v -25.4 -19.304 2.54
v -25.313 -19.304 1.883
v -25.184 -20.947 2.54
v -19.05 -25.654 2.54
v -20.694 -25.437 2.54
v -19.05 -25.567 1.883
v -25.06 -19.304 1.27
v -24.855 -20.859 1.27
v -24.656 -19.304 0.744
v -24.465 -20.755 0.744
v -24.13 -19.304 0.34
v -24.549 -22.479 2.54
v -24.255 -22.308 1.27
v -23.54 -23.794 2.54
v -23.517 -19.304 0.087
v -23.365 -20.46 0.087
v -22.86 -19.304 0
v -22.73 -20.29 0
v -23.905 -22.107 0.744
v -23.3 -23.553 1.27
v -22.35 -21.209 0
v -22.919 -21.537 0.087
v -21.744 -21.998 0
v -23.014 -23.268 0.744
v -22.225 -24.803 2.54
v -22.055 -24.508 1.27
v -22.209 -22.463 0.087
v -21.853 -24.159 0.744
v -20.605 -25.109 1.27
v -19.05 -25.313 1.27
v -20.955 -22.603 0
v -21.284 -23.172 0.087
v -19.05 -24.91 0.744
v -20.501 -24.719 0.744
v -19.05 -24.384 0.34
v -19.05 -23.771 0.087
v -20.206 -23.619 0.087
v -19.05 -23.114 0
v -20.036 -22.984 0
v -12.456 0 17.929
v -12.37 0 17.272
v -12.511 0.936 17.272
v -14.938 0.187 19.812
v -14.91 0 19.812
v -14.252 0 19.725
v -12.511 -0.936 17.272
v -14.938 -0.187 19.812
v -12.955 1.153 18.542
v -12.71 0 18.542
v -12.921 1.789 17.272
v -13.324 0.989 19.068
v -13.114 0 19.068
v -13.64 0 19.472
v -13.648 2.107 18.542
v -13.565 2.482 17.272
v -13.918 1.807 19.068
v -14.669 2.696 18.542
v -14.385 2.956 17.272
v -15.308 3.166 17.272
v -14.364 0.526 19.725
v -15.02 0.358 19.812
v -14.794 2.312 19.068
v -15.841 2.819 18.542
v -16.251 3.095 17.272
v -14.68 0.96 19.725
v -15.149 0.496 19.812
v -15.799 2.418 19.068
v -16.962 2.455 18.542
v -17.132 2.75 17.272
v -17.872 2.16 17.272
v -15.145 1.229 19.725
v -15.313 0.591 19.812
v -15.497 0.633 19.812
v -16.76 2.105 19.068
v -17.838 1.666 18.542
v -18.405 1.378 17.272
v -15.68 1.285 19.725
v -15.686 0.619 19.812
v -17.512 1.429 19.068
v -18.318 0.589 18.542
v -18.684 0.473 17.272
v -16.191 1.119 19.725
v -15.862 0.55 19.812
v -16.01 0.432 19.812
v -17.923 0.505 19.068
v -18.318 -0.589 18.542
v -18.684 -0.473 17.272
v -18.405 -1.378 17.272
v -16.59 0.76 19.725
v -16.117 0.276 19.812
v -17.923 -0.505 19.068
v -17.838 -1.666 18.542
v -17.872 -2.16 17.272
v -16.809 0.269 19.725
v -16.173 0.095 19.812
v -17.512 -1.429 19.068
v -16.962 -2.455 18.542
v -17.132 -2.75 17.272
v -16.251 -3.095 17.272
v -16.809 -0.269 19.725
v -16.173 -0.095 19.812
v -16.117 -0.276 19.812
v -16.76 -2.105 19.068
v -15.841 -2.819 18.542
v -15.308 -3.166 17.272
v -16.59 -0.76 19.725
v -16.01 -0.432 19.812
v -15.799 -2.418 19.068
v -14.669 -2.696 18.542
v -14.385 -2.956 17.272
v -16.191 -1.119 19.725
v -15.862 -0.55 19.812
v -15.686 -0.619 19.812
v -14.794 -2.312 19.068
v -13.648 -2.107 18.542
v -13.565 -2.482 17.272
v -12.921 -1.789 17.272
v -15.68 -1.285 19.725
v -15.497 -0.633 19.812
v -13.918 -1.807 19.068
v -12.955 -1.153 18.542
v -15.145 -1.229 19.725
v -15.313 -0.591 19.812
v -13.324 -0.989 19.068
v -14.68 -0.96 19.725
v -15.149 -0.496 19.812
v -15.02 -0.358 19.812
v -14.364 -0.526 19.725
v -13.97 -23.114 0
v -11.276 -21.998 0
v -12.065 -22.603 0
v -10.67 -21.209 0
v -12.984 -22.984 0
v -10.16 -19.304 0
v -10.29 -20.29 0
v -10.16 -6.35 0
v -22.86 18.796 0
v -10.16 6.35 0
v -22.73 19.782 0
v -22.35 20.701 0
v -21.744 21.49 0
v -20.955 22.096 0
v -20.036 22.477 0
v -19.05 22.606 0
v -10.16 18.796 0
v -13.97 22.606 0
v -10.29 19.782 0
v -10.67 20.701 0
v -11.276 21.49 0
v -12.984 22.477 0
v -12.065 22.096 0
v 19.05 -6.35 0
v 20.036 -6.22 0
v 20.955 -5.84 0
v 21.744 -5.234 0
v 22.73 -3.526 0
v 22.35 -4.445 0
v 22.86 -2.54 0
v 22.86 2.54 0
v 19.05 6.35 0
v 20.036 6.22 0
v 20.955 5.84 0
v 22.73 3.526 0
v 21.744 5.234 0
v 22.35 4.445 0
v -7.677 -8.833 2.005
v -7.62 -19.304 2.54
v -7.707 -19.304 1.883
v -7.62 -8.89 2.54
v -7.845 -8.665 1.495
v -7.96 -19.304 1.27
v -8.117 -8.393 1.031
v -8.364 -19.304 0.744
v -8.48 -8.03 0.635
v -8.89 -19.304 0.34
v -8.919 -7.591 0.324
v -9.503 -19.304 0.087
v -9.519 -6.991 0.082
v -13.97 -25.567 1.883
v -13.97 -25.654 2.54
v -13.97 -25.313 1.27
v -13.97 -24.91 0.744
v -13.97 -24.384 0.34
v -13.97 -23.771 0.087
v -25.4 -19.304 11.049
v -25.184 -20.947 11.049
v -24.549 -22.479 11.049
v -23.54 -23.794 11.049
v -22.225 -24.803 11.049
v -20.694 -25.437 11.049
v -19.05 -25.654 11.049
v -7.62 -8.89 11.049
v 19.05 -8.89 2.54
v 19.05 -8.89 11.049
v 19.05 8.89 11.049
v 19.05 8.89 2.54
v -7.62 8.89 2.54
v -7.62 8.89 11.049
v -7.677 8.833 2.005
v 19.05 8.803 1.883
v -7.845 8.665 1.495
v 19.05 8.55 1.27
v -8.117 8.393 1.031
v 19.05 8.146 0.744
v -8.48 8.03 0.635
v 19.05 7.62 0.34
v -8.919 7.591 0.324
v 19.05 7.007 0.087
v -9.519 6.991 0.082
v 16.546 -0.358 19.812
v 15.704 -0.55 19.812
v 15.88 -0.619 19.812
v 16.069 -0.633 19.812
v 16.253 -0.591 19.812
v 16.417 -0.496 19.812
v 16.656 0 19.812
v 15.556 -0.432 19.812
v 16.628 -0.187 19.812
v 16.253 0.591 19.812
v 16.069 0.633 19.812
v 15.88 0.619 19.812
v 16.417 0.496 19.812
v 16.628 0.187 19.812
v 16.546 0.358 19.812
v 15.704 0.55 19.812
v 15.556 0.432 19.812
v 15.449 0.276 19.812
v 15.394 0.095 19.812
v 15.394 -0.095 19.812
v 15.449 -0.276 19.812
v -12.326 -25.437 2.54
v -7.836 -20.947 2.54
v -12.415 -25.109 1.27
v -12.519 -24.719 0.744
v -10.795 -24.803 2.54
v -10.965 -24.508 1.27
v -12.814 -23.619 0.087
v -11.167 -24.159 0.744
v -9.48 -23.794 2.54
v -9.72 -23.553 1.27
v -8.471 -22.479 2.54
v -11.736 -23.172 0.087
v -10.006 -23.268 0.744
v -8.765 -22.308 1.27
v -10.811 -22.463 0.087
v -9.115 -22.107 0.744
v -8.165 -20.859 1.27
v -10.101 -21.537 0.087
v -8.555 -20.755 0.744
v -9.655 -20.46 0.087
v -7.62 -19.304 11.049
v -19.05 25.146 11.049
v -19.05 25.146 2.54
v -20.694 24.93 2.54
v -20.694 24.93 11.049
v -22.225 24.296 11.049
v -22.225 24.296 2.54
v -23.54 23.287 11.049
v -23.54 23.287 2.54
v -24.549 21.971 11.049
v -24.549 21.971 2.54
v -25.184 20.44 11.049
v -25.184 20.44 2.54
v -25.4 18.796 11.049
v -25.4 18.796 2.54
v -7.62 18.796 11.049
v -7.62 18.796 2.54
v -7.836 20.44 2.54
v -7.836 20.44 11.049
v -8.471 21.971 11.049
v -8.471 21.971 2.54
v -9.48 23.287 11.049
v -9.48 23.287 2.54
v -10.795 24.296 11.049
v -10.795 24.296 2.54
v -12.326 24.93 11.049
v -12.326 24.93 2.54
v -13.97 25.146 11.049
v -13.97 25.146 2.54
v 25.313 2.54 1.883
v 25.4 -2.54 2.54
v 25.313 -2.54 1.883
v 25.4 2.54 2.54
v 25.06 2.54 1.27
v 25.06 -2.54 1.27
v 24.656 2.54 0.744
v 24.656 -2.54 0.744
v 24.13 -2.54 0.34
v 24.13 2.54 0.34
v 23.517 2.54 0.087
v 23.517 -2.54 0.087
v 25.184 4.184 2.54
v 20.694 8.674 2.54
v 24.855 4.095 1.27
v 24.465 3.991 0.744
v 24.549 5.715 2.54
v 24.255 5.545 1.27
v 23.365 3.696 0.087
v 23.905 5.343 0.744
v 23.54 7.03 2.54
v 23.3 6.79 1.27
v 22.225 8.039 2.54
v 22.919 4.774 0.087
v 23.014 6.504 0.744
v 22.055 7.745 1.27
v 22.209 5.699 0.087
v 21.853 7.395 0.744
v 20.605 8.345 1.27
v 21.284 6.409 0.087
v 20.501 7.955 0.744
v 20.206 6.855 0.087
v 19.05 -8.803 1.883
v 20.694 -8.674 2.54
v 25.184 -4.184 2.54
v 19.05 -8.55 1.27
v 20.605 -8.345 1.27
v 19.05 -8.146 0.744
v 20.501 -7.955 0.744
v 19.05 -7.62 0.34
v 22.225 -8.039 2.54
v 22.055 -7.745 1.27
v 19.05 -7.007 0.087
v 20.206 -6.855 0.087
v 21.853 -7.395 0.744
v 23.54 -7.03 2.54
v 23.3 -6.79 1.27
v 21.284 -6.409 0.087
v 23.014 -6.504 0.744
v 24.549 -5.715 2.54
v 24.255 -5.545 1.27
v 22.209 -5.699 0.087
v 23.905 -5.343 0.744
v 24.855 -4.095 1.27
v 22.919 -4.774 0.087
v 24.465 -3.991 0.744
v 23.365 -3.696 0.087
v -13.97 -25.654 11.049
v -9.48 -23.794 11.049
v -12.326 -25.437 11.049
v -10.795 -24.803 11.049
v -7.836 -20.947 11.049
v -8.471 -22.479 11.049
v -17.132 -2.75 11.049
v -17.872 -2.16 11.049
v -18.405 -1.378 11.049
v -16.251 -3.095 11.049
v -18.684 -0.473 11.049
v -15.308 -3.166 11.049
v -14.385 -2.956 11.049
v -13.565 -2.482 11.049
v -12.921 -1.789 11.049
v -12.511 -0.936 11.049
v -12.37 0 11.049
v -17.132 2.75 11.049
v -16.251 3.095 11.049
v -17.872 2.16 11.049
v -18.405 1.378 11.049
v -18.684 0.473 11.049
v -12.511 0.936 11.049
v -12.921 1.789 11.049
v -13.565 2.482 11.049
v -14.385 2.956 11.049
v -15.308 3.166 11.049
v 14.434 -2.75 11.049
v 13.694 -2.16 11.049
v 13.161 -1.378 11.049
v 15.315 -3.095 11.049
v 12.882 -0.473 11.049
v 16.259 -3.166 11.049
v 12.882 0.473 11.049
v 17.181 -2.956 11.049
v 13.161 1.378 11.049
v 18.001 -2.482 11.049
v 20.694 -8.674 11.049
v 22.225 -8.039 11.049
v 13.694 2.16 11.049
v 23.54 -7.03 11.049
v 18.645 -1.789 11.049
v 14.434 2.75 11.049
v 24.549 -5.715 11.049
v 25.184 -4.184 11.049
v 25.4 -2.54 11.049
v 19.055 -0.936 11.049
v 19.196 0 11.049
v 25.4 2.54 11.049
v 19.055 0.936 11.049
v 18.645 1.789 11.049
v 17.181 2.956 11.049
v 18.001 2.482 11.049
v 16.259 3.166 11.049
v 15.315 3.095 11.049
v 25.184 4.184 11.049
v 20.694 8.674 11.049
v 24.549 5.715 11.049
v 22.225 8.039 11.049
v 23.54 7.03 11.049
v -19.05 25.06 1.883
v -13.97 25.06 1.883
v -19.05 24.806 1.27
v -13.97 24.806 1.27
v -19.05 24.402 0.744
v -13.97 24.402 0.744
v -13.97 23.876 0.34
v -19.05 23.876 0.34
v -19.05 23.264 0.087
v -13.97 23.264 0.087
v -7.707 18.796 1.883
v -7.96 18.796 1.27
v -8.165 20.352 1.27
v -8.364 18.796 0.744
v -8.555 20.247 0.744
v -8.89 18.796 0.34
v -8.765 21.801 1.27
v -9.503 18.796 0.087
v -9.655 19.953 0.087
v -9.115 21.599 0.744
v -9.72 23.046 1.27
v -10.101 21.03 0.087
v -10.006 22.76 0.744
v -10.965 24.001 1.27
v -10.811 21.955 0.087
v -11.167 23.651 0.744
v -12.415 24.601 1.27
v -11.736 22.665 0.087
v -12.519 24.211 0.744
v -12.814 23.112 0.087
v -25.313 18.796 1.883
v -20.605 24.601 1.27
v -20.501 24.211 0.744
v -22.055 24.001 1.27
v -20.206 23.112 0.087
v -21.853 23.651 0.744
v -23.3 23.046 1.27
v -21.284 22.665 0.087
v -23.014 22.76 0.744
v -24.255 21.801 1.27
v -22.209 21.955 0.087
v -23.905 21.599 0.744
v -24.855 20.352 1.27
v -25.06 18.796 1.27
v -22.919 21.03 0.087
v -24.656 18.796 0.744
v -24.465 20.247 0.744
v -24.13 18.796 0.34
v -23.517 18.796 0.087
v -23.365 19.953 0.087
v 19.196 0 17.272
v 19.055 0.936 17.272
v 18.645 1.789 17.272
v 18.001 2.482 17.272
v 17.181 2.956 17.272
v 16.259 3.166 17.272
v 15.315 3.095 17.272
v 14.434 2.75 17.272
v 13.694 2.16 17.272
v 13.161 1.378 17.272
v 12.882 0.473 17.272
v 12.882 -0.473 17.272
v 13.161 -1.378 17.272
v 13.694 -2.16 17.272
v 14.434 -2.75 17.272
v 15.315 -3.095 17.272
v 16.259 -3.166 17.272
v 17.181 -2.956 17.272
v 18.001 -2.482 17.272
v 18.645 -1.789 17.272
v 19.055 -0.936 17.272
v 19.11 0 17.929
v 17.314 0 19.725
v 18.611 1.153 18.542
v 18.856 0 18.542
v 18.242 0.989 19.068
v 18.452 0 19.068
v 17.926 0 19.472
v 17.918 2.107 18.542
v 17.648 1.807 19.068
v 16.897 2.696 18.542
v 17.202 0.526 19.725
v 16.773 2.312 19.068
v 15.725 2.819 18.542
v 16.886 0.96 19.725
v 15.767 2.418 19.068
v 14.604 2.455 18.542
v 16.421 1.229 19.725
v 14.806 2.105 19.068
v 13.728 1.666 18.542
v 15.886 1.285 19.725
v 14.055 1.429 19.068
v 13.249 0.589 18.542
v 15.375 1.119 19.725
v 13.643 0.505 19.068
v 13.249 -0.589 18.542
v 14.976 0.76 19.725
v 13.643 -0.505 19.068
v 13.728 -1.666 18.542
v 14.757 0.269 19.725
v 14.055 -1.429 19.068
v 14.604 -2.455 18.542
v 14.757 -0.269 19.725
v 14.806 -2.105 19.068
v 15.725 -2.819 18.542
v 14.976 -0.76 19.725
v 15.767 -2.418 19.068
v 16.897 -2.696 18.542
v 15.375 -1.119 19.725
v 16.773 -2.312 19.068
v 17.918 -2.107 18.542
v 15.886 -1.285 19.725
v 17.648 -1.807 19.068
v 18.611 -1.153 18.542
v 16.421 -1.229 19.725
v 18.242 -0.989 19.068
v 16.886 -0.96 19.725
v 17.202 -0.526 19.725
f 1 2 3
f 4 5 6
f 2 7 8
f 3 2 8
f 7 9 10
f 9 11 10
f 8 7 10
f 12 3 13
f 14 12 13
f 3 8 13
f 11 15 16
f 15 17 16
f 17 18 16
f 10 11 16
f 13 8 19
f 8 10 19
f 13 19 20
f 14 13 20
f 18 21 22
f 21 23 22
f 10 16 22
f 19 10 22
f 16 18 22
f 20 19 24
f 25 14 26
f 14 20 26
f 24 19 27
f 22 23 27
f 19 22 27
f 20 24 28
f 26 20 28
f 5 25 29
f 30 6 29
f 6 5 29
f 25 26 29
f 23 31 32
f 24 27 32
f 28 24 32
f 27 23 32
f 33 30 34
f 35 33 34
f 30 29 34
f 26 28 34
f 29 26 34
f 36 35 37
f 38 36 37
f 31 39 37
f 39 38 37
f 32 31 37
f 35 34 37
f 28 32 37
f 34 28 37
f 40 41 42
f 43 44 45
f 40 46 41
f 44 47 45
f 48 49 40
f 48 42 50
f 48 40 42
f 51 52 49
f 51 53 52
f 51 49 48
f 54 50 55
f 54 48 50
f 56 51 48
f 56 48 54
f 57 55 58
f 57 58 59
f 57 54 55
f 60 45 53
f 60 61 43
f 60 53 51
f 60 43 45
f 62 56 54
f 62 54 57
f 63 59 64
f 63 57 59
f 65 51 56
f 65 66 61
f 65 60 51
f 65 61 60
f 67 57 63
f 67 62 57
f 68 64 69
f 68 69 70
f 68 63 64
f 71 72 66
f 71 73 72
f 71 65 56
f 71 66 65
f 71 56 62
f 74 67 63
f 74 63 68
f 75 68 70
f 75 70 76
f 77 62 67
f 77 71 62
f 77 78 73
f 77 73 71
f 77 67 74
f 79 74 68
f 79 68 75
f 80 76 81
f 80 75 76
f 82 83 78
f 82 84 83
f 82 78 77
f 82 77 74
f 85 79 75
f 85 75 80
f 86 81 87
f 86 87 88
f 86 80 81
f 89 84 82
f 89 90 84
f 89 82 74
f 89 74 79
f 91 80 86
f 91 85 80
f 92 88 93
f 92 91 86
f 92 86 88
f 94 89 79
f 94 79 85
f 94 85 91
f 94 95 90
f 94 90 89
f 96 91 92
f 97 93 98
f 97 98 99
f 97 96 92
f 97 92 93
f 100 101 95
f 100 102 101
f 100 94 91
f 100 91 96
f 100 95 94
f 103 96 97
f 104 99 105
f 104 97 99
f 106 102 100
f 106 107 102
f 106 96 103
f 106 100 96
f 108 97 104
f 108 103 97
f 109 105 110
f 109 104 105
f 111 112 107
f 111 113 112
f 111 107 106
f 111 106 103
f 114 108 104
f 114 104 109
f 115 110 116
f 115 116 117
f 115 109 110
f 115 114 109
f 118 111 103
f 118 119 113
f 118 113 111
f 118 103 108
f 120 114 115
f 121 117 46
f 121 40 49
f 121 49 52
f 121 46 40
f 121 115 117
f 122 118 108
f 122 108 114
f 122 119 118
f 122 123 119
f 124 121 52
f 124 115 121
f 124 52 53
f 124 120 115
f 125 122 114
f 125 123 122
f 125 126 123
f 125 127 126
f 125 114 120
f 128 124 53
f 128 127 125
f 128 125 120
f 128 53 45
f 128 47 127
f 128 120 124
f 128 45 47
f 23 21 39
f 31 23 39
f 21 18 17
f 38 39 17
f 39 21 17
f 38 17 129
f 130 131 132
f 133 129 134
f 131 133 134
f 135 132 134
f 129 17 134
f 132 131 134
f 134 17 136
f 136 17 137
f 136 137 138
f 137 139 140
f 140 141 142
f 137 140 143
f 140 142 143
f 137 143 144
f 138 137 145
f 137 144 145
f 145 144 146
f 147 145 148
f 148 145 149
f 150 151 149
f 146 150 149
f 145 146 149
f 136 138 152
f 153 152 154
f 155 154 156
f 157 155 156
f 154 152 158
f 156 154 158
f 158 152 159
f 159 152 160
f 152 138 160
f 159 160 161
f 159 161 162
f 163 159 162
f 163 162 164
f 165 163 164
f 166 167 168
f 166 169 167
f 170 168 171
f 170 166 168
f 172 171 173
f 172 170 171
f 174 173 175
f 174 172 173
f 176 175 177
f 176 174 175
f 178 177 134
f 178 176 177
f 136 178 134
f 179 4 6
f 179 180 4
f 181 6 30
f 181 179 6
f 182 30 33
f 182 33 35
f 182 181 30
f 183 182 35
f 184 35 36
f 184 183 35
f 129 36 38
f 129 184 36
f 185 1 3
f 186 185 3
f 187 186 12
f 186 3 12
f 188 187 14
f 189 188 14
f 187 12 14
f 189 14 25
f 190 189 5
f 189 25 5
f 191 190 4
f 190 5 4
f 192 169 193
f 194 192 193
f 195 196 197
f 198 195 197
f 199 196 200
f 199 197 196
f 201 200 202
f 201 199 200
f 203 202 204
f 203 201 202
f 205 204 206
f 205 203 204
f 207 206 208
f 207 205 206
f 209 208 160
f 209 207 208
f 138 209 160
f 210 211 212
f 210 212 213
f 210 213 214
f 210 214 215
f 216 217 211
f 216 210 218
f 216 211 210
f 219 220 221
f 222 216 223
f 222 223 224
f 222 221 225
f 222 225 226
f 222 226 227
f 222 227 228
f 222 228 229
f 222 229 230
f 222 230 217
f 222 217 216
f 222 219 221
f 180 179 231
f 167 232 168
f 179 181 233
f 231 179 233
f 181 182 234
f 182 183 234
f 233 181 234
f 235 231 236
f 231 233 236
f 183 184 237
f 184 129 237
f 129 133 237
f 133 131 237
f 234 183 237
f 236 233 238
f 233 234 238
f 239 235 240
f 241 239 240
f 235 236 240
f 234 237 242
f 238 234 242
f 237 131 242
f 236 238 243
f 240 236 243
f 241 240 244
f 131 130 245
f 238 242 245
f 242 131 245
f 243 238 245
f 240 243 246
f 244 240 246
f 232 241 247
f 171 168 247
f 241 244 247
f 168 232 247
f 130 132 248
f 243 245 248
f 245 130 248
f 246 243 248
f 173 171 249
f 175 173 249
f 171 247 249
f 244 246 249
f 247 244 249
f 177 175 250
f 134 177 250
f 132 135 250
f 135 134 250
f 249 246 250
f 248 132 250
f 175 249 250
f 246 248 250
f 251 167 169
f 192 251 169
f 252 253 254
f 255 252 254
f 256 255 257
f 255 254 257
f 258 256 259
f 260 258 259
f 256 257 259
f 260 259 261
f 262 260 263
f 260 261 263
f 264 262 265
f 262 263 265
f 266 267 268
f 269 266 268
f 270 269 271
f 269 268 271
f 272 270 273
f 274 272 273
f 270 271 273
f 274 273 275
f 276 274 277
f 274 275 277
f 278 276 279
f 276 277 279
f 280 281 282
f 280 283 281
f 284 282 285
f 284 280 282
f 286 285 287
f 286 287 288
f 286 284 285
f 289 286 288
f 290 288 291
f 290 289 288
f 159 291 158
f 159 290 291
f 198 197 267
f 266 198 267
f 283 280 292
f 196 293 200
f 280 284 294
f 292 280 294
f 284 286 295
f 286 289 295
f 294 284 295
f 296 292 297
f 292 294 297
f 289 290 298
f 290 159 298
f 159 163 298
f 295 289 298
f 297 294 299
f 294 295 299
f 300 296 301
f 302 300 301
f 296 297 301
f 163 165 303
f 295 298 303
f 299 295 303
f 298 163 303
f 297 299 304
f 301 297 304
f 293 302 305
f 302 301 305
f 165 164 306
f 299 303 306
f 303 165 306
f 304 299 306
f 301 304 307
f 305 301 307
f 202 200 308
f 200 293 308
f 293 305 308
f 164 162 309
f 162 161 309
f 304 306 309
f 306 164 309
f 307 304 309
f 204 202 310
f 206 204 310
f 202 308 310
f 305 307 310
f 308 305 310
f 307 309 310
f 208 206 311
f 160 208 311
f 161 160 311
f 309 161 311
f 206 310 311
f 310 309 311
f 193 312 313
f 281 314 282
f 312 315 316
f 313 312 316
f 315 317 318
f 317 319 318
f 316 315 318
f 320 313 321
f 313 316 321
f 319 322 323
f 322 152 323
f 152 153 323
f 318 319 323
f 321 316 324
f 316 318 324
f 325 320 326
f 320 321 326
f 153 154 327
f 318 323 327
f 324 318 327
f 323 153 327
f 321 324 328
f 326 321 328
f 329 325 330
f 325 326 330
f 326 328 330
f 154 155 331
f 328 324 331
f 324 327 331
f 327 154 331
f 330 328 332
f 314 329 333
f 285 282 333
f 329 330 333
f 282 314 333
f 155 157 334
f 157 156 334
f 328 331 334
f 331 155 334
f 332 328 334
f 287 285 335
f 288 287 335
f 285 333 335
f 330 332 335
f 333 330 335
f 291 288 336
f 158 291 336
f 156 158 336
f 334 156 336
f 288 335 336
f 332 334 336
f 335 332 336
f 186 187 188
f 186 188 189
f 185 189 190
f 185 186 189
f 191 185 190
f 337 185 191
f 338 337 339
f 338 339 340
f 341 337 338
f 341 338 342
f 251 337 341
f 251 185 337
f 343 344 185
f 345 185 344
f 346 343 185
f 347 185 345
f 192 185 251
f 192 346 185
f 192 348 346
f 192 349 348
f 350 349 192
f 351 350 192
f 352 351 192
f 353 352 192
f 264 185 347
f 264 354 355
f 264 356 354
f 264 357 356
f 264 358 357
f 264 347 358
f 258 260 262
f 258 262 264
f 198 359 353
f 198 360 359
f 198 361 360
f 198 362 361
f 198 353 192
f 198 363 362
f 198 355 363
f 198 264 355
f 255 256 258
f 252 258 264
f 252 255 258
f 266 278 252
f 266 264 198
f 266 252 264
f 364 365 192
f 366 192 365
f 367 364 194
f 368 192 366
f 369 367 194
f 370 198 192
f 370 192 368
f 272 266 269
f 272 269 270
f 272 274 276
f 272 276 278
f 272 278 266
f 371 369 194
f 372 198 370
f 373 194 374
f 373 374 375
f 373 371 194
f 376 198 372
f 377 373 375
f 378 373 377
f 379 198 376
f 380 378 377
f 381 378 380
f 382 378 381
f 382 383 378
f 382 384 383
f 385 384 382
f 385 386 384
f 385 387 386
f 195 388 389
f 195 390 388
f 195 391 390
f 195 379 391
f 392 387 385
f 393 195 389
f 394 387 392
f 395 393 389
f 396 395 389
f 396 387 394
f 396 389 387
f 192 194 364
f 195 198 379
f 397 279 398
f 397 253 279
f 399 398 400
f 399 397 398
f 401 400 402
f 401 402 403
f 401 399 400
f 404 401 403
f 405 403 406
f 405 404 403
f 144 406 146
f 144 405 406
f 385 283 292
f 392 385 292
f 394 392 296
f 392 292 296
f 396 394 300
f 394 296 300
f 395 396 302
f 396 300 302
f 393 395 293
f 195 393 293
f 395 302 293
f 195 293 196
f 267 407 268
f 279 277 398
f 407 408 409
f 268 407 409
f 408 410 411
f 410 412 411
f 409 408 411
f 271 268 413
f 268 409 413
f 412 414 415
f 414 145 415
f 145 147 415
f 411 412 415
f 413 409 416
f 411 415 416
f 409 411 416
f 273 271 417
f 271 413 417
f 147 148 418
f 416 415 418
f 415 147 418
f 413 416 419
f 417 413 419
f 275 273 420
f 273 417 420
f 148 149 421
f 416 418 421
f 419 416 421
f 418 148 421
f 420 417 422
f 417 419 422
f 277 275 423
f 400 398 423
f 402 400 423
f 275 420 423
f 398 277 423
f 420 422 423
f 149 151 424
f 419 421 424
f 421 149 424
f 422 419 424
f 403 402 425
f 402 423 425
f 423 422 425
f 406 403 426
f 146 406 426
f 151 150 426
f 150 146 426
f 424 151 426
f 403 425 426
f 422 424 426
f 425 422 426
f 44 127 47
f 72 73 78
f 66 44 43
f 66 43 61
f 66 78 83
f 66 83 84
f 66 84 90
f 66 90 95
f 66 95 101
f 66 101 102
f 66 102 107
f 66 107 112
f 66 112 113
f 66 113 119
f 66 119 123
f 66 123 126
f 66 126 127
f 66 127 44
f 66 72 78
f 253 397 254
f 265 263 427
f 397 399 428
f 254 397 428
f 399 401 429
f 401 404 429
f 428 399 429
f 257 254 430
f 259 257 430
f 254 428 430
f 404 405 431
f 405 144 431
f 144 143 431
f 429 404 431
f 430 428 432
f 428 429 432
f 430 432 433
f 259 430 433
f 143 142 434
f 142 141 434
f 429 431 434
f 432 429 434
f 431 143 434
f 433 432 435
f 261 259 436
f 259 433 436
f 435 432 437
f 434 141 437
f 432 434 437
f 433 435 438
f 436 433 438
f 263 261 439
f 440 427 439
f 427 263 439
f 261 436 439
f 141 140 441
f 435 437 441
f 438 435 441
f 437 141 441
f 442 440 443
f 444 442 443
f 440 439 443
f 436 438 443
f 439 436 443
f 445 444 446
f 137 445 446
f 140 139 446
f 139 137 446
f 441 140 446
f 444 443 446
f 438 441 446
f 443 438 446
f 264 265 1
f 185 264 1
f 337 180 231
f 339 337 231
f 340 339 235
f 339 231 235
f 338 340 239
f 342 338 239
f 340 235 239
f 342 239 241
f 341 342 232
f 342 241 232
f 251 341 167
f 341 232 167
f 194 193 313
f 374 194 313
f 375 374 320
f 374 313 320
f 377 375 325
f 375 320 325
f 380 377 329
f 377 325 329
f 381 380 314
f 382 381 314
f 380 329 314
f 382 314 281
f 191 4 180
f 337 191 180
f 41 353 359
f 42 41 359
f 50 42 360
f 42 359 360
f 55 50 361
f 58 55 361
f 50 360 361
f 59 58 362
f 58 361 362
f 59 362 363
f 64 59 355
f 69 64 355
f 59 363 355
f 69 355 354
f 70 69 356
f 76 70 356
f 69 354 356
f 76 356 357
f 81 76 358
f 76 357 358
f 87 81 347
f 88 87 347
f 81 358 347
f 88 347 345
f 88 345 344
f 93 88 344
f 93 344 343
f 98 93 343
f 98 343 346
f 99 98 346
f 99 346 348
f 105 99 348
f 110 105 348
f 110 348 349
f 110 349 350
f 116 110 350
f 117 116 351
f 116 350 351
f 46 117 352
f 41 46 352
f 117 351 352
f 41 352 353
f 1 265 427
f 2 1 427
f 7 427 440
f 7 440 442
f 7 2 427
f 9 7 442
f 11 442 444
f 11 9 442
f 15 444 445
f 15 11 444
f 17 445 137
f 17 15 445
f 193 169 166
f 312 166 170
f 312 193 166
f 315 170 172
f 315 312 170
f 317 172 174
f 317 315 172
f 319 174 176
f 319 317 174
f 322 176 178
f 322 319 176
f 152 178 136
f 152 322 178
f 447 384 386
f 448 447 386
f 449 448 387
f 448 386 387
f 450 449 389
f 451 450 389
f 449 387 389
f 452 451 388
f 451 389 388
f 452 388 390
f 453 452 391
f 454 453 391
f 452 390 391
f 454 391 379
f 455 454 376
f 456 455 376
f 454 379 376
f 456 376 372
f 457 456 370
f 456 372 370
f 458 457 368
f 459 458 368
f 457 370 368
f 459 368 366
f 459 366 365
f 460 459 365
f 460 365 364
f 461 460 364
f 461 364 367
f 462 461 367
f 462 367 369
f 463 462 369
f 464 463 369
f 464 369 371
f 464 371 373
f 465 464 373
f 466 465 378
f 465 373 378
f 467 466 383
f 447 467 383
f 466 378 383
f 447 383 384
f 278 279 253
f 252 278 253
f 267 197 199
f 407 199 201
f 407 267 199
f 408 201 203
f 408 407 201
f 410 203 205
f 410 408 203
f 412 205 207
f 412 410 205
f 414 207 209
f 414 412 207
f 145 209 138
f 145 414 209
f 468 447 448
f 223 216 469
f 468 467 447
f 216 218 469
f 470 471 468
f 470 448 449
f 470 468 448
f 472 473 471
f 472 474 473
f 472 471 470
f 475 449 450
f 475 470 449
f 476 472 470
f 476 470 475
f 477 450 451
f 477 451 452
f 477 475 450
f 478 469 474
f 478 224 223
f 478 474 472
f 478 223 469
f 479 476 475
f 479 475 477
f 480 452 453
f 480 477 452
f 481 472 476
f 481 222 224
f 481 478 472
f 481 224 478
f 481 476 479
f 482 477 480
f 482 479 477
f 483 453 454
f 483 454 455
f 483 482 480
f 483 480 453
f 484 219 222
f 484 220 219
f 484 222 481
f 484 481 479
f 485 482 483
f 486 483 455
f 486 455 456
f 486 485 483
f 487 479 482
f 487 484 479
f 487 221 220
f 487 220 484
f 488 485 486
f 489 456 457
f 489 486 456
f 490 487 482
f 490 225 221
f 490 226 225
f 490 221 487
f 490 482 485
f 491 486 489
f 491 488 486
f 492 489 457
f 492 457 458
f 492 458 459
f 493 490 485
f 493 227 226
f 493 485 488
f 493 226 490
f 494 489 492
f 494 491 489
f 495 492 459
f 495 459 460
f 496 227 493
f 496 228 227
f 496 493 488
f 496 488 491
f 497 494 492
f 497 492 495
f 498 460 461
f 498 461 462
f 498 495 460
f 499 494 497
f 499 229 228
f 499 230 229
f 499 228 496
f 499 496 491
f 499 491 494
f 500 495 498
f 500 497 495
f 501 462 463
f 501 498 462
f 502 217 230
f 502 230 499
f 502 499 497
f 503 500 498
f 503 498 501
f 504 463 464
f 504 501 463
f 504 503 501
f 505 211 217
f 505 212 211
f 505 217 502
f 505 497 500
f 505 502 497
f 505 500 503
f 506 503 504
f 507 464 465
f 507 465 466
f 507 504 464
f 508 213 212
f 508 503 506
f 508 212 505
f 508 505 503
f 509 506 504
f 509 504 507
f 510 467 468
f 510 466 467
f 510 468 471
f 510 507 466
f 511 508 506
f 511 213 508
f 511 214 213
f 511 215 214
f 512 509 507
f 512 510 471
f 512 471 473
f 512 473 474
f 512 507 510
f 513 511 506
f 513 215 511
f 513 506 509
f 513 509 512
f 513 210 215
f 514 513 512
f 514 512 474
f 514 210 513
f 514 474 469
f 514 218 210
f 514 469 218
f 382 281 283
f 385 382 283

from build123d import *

# Parameters (mm, degrees)
F0_W     = 17.78
F0_H     = 17.78
F1_DEPTH = 11.049
F2_R     = 2.54
F3_R     = 3.175
F4_DEPTH = 8.763
F5_R     = 2.54


with BuildPart() as f1:
    # F0 (on Top) → F1 (new body)
    with BuildSketch(Plane.XY):
        with Locations((-16.51, 0)):
            Rectangle(F0_W, F0_H)
        with BuildLine():
            Line((-7.62, -19.303608), (-7.62, -8.89))
            Line((-7.62, -8.89), (-25.4, -8.89))
            Line((-25.4, -8.89), (-25.4, -19.303608))
            ThreePointArc((-25.4, -19.303608), (-23.540128, -23.793736), (-19.05, -25.653608))
            Line((-19.05, -25.653608), (-13.97, -25.653608))
            ThreePointArc((-13.97, -25.653608), (-9.479872, -23.793736), (-7.62, -19.303608))
        make_face()
        with BuildLine():
            Line((-25.4, 8.89), (-7.62, 8.89))
            Line((-7.62, 8.89), (-7.62, 18.796392))
            ThreePointArc((-7.62, 18.796392), (-9.479872, 23.28652), (-13.97, 25.146392))
            Line((-13.97, 25.146392), (-19.05, 25.146392))
            ThreePointArc((-19.05, 25.146392), (-23.540128, 23.28652), (-25.4, 18.796392))
            Line((-25.4, 18.796392), (-25.4, 8.89))
        make_face()
        with BuildLine():
            Line((-7.62, -8.89), (19.05, -8.89))
            ThreePointArc((19.05, -8.89), (23.540128, -7.030128), (25.4, -2.54))
            Line((25.4, -2.54), (25.4, 2.54))
            ThreePointArc((25.4, 2.54), (23.540128, 7.030128), (19.05, 8.89))
            Line((19.05, 8.89), (-7.62, 8.89))
            Line((-7.62, 8.89), (-7.62, -8.89))
        make_face()
    extrude(amount=F1_DEPTH)

    # F2
    f2_edges = [f1.edges().sort_by_distance(p)[0] for p in [
        (-7.62, -14.096804, 0),
        (5.715, -8.89, 0),
        (23.540128, -7.030128, 0),
    ]]
    fillet(f2_edges, radius=F2_R)

    # F3 (on face) → F4 (join)
    with BuildSketch(Plane.XY.offset(11.049)):
        with Locations((16.021419, 0)):
            Circle(F3_R)
        with Locations((-15.5448, 0)):
            Circle(F3_R)
    extrude(amount=F4_DEPTH)

    # F5
    f5_edges = [f1.edges().sort_by_distance(p)[0] for p in [
        (-18.7198, 0, 19.812),
        (12.846419, 0, 19.812),
    ]]
    fillet(f5_edges, radius=F5_R)


solid = f1.part
